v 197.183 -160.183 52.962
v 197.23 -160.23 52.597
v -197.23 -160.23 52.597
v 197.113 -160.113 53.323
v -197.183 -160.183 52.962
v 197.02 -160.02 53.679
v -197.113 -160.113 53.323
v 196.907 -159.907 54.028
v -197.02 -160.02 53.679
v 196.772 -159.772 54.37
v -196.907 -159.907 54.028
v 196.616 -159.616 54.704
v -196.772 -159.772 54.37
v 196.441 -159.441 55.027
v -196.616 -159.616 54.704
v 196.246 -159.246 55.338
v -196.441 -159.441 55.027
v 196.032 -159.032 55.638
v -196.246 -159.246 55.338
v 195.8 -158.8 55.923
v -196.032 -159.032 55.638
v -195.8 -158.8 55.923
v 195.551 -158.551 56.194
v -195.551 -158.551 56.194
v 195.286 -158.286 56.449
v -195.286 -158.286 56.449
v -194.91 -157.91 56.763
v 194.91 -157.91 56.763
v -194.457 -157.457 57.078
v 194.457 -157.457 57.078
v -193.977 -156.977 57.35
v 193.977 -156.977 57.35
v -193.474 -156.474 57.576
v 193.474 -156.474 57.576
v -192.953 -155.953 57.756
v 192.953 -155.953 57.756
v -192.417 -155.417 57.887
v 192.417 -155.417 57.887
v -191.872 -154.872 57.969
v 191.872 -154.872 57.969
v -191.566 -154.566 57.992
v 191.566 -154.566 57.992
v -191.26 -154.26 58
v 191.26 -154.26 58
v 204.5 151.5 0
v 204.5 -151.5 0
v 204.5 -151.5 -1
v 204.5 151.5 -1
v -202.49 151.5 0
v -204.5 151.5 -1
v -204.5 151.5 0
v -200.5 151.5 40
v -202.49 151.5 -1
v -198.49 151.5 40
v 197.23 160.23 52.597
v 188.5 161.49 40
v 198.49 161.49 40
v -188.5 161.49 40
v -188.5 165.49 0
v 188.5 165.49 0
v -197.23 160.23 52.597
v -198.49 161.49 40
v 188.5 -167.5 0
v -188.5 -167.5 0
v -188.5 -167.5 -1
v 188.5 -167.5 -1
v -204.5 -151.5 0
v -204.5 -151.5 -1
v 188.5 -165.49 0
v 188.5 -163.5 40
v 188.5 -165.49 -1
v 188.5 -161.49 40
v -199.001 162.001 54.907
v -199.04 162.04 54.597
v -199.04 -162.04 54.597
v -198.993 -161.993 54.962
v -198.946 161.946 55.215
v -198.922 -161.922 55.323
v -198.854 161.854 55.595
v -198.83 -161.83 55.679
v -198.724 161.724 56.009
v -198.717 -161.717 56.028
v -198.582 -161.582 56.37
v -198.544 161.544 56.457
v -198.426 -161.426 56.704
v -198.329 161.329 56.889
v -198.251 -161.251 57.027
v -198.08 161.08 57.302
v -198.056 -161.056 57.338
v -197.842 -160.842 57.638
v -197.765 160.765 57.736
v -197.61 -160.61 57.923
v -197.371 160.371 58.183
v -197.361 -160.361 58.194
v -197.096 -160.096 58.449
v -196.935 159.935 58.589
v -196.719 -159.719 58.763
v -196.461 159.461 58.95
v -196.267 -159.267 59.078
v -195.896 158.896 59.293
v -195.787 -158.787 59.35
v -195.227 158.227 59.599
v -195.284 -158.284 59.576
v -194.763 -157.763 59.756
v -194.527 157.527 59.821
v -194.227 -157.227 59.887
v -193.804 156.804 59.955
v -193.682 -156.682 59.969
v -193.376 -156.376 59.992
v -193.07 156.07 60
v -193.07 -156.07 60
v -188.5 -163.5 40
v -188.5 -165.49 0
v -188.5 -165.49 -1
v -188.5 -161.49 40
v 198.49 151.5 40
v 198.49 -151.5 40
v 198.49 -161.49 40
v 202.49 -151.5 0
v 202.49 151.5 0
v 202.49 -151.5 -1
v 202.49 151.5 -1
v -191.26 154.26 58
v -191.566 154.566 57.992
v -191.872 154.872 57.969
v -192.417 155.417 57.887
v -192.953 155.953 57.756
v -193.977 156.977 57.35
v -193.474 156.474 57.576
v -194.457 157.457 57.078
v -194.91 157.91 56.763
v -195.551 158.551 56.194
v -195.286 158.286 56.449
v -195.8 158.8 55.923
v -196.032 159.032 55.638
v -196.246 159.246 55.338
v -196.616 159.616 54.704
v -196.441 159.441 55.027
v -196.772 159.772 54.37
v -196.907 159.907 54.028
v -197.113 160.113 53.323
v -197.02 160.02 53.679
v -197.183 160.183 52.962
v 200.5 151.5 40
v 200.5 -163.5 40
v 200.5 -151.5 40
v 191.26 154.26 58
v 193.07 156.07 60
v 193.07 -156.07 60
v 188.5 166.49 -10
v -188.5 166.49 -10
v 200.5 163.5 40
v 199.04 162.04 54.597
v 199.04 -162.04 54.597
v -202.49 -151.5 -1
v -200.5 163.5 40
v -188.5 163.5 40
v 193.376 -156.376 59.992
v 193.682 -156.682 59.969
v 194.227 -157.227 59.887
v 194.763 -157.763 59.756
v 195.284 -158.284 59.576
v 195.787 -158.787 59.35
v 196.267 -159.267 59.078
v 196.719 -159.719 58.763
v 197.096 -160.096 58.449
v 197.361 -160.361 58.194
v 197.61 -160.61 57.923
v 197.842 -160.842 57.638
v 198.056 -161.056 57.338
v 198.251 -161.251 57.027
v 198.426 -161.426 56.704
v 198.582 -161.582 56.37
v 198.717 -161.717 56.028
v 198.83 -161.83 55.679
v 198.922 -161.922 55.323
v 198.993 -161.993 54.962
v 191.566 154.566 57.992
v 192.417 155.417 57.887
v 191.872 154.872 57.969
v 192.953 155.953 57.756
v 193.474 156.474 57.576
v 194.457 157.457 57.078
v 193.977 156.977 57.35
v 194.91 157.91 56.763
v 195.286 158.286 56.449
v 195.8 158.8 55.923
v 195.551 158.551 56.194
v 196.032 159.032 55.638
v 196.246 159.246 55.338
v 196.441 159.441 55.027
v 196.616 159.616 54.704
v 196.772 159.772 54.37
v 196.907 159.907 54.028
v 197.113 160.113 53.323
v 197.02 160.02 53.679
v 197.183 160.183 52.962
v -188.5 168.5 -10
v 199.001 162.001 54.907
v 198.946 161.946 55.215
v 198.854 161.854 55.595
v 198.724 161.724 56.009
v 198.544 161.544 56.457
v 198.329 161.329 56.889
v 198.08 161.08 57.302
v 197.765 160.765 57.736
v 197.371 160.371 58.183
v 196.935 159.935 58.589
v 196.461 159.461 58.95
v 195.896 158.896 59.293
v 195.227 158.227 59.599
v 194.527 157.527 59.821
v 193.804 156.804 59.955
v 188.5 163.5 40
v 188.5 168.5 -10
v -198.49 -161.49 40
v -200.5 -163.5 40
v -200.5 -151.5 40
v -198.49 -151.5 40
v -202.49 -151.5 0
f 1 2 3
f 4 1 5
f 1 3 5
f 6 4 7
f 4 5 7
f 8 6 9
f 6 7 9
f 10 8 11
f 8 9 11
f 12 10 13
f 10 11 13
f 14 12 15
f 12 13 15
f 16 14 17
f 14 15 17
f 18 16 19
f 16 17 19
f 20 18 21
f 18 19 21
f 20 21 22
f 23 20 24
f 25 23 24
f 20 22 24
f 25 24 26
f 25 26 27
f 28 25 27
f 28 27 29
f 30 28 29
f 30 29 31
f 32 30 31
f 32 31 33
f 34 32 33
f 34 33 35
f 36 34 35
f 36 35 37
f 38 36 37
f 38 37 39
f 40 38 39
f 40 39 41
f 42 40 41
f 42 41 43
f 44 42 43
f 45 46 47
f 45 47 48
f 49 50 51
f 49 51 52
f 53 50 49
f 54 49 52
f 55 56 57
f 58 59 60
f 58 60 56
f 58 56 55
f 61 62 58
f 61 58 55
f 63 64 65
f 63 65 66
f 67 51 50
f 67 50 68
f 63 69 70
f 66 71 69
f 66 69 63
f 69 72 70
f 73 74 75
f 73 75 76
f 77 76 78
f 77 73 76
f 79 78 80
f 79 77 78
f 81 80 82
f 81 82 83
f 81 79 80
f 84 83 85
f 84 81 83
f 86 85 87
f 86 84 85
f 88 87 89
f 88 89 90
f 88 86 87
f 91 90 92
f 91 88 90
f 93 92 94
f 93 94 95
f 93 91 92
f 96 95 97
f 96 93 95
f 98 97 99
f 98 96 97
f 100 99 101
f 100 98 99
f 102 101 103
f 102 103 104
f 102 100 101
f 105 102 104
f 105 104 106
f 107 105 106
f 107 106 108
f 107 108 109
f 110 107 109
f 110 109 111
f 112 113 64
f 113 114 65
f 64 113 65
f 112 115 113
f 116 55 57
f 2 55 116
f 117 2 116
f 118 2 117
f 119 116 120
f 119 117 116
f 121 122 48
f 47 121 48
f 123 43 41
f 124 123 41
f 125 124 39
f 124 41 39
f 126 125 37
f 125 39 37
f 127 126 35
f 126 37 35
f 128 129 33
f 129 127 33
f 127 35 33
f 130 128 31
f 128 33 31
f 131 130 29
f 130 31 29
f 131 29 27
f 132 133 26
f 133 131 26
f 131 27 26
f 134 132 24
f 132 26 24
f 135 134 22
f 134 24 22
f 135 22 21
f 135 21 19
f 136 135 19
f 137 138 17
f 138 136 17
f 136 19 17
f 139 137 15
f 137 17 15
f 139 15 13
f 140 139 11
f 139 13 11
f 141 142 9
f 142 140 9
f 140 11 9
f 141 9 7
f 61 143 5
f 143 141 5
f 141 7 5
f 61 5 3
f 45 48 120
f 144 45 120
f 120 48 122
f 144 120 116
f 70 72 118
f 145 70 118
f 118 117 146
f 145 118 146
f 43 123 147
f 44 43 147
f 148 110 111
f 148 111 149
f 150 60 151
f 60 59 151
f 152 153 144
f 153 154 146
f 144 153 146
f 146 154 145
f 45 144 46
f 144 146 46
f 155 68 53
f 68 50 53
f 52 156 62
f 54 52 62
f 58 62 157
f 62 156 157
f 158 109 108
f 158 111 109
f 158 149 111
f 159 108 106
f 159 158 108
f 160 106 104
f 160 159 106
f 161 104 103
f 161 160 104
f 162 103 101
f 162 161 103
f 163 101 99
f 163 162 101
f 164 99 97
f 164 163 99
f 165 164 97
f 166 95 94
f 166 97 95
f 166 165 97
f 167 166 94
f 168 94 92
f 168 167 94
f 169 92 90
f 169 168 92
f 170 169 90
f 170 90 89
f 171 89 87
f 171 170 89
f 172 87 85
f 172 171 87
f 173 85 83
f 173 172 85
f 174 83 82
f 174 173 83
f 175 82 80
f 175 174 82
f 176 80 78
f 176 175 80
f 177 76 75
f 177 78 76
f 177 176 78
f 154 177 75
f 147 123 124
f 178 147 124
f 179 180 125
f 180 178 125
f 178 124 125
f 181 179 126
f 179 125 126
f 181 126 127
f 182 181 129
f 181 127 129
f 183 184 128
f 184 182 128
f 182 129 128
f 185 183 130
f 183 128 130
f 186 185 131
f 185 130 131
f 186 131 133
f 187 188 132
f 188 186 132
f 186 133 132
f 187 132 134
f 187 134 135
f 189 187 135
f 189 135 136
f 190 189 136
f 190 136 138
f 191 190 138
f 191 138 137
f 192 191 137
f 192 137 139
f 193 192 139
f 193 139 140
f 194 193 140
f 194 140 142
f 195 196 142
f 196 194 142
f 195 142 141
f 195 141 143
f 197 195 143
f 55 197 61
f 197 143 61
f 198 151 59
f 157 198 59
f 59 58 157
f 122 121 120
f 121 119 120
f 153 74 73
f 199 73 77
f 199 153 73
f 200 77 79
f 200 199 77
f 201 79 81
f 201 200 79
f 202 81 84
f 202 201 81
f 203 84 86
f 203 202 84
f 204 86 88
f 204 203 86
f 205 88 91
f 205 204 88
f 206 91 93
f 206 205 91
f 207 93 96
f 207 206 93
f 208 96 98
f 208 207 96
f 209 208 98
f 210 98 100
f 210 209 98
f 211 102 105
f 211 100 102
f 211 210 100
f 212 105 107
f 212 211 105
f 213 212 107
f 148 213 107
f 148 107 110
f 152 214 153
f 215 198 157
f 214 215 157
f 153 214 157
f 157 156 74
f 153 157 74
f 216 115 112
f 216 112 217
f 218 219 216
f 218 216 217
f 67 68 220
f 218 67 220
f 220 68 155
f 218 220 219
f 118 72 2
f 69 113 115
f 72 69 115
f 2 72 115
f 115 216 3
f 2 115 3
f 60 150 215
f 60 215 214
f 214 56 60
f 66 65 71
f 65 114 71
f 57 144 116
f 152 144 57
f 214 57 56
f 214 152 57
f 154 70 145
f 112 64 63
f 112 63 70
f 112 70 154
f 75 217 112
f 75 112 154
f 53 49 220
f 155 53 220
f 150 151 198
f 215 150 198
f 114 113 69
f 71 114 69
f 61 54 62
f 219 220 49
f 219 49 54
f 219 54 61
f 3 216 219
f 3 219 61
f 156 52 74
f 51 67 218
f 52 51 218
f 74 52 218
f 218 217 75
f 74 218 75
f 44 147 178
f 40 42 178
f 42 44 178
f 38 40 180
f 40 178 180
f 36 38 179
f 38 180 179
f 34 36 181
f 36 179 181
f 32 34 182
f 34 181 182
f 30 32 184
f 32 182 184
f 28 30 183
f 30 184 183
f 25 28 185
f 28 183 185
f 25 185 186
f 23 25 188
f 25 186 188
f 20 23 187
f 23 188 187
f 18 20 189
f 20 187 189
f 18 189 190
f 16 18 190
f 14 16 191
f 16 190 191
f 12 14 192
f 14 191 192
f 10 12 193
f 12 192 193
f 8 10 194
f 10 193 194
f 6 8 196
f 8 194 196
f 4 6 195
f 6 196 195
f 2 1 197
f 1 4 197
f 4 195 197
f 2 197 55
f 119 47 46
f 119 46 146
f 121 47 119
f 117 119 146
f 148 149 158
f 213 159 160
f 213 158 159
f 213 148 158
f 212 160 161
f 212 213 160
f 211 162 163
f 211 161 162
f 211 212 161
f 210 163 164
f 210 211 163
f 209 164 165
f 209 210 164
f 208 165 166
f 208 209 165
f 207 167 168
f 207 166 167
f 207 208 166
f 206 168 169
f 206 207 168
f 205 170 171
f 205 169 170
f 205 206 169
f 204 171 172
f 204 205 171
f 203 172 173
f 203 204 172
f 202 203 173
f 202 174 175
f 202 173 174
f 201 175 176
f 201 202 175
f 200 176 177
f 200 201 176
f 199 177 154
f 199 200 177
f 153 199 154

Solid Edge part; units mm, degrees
sketch "Sketch1" plane through (0, 0, 0) normal (0, 0, 1) x (1, 0, 0)
  line L0 (-204.5, -167.5) -> (204.5, -167.5)
  line L1 (204.5, -167.5) -> (204.5, 167.5)
  line L2 (204.5, 167.5) -> (-204.5, 167.5)
  line L3 (-204.5, 167.5) -> (-204.5, -167.5)
  dimension "D1" = 409
  dimension "D2" = 335
extrude "Protrusion1" add sketch "Sketch1" along normal blind 60
sketch "Sketch2" plane through (0, -167.5, 30) normal (0, -1, 0) x (1, 0, 0)
  line L0 (-204.5, -30) -> (-198.5, 30)
  line L1 (-198.5, 30) -> (-204.5, 30)
  line L2 (-204.5, 30) -> (-204.5, -30)
  line L3 (198.5, 30) -> (204.5, -30)
  line L4 (204.5, -30) -> (204.5, 30)
  line L5 (204.5, 30) -> (198.5, 30)
  dimension "D1" = 6
  dimension "D2" = 6
extrude "Cutout1" cut sketch "Sketch2" against normal up to next
sketch "Sketch3" plane through (-210, 0, 0) normal (-1, 0, 0) x (0, -1, 0)
  line L0 (-167.5, 0) -> (-161.5, 60)
  line L1 (-161.5, 60) -> (-167.5, 60)
  line L2 (-167.5, 60) -> (-167.5, 0)
  line L3 (167.5, 0) -> (161.5, 60)
  line L4 (161.5, 60) -> (167.5, 60)
  line L5 (167.5, 60) -> (167.5, 0)
  dimension "D1" = 6
  dimension "D2" = 6
extrude "Cutout_2" cut sketch "Sketch3" against normal up to next
shell "Thin_Wall" thickness 2 removed faces 1 at (-140.4233, -108.3167, 0)
sketch "Sketch4" plane through (0, 0, 0) normal (0, 0, -1) x (-1, 0, 0)
  line L0 (204.5, 165.49) -> (204.5, -167.5)
  line L1 (204.5, -167.5) -> (-204.5, -167.5)
  line L2 (-204.5, -167.5) -> (-204.5, 165.49)
  line L3 (-202.49, 165.49) -> (-204.5, 165.49)
  line L4 (-202.49, -165.49) -> (-202.49, 165.49)
  line L5 (202.49, -165.49) -> (-202.49, -165.49)
  line L6 (202.49, 165.49) -> (202.49, -165.49)
  line L7 (202.49, 165.49) -> (204.5, 165.49)
extrude "Attachment" add sketch "Sketch4" along normal blind 1
sketch "Sketch5" plane through (0, 0, -1) normal (0, 0, -1) x (0, 1, 0)
  line L0 (-167.5, 204.5) -> (-151.5, 204.5)
  line L1 (-151.5, 204.5) -> (-151.5, 188.5)
  line L2 (-151.5, 188.5) -> (-167.5, 188.5)
  line L3 (-167.5, 188.5) -> (-167.5, 204.5)
  line L4 (167.5, 204.5) -> (151.5, 204.5)
  line L5 (151.5, 204.5) -> (151.5, 188.5)
  line L6 (151.5, 188.5) -> (167.5, 188.5)
  line L7 (167.5, 188.5) -> (167.5, 204.5)
  line L8 (167.5, -204.5) -> (151.5, -204.5)
  line L9 (151.5, -204.5) -> (151.5, -188.5)
  line L10 (151.5, -188.5) -> (167.5, -188.5)
  line L11 (167.5, -188.5) -> (167.5, -204.5)
  line L12 (-167.5, -204.5) -> (-151.5, -204.5)
  line L13 (-151.5, -204.5) -> (-151.5, -188.5)
  line L14 (-151.5, -188.5) -> (-167.5, -188.5)
  line L15 (-167.5, -188.5) -> (-167.5, -204.5)
  dimension "D1" = 16
  dimension "D2" = 16
extrude "Cutout___Pillars" cut sketch "Sketch5" against normal blind 41
fillet "Round___Top" radius 6 8 edges at (0, -161.5, 60) (198.5, 0, 60) (0, 161.5, 60) (-198.5, 0, 60) (0, -159.69, 58) (196.69, 0, 58) (0, 159.69, 58) (-196.69, 0, 58)
sketch "Sketch6" plane through (-188.5, 0, 0) normal (1, 0, 0) x (0, 1, 0)
  line L0 (165.49, 0) -> (166.49, -10)
  line L1 (166.49, -10) -> (168.5, -10)
  line L2 (168.5, -10) -> (167.5, 0)
  line L3 (167.5, 0) -> (165.49, 0)
  dimension "D1" = 10
extrude "Front" add sketch "Sketch6" along normal blind 377
properties material "Glass, general industrial"
